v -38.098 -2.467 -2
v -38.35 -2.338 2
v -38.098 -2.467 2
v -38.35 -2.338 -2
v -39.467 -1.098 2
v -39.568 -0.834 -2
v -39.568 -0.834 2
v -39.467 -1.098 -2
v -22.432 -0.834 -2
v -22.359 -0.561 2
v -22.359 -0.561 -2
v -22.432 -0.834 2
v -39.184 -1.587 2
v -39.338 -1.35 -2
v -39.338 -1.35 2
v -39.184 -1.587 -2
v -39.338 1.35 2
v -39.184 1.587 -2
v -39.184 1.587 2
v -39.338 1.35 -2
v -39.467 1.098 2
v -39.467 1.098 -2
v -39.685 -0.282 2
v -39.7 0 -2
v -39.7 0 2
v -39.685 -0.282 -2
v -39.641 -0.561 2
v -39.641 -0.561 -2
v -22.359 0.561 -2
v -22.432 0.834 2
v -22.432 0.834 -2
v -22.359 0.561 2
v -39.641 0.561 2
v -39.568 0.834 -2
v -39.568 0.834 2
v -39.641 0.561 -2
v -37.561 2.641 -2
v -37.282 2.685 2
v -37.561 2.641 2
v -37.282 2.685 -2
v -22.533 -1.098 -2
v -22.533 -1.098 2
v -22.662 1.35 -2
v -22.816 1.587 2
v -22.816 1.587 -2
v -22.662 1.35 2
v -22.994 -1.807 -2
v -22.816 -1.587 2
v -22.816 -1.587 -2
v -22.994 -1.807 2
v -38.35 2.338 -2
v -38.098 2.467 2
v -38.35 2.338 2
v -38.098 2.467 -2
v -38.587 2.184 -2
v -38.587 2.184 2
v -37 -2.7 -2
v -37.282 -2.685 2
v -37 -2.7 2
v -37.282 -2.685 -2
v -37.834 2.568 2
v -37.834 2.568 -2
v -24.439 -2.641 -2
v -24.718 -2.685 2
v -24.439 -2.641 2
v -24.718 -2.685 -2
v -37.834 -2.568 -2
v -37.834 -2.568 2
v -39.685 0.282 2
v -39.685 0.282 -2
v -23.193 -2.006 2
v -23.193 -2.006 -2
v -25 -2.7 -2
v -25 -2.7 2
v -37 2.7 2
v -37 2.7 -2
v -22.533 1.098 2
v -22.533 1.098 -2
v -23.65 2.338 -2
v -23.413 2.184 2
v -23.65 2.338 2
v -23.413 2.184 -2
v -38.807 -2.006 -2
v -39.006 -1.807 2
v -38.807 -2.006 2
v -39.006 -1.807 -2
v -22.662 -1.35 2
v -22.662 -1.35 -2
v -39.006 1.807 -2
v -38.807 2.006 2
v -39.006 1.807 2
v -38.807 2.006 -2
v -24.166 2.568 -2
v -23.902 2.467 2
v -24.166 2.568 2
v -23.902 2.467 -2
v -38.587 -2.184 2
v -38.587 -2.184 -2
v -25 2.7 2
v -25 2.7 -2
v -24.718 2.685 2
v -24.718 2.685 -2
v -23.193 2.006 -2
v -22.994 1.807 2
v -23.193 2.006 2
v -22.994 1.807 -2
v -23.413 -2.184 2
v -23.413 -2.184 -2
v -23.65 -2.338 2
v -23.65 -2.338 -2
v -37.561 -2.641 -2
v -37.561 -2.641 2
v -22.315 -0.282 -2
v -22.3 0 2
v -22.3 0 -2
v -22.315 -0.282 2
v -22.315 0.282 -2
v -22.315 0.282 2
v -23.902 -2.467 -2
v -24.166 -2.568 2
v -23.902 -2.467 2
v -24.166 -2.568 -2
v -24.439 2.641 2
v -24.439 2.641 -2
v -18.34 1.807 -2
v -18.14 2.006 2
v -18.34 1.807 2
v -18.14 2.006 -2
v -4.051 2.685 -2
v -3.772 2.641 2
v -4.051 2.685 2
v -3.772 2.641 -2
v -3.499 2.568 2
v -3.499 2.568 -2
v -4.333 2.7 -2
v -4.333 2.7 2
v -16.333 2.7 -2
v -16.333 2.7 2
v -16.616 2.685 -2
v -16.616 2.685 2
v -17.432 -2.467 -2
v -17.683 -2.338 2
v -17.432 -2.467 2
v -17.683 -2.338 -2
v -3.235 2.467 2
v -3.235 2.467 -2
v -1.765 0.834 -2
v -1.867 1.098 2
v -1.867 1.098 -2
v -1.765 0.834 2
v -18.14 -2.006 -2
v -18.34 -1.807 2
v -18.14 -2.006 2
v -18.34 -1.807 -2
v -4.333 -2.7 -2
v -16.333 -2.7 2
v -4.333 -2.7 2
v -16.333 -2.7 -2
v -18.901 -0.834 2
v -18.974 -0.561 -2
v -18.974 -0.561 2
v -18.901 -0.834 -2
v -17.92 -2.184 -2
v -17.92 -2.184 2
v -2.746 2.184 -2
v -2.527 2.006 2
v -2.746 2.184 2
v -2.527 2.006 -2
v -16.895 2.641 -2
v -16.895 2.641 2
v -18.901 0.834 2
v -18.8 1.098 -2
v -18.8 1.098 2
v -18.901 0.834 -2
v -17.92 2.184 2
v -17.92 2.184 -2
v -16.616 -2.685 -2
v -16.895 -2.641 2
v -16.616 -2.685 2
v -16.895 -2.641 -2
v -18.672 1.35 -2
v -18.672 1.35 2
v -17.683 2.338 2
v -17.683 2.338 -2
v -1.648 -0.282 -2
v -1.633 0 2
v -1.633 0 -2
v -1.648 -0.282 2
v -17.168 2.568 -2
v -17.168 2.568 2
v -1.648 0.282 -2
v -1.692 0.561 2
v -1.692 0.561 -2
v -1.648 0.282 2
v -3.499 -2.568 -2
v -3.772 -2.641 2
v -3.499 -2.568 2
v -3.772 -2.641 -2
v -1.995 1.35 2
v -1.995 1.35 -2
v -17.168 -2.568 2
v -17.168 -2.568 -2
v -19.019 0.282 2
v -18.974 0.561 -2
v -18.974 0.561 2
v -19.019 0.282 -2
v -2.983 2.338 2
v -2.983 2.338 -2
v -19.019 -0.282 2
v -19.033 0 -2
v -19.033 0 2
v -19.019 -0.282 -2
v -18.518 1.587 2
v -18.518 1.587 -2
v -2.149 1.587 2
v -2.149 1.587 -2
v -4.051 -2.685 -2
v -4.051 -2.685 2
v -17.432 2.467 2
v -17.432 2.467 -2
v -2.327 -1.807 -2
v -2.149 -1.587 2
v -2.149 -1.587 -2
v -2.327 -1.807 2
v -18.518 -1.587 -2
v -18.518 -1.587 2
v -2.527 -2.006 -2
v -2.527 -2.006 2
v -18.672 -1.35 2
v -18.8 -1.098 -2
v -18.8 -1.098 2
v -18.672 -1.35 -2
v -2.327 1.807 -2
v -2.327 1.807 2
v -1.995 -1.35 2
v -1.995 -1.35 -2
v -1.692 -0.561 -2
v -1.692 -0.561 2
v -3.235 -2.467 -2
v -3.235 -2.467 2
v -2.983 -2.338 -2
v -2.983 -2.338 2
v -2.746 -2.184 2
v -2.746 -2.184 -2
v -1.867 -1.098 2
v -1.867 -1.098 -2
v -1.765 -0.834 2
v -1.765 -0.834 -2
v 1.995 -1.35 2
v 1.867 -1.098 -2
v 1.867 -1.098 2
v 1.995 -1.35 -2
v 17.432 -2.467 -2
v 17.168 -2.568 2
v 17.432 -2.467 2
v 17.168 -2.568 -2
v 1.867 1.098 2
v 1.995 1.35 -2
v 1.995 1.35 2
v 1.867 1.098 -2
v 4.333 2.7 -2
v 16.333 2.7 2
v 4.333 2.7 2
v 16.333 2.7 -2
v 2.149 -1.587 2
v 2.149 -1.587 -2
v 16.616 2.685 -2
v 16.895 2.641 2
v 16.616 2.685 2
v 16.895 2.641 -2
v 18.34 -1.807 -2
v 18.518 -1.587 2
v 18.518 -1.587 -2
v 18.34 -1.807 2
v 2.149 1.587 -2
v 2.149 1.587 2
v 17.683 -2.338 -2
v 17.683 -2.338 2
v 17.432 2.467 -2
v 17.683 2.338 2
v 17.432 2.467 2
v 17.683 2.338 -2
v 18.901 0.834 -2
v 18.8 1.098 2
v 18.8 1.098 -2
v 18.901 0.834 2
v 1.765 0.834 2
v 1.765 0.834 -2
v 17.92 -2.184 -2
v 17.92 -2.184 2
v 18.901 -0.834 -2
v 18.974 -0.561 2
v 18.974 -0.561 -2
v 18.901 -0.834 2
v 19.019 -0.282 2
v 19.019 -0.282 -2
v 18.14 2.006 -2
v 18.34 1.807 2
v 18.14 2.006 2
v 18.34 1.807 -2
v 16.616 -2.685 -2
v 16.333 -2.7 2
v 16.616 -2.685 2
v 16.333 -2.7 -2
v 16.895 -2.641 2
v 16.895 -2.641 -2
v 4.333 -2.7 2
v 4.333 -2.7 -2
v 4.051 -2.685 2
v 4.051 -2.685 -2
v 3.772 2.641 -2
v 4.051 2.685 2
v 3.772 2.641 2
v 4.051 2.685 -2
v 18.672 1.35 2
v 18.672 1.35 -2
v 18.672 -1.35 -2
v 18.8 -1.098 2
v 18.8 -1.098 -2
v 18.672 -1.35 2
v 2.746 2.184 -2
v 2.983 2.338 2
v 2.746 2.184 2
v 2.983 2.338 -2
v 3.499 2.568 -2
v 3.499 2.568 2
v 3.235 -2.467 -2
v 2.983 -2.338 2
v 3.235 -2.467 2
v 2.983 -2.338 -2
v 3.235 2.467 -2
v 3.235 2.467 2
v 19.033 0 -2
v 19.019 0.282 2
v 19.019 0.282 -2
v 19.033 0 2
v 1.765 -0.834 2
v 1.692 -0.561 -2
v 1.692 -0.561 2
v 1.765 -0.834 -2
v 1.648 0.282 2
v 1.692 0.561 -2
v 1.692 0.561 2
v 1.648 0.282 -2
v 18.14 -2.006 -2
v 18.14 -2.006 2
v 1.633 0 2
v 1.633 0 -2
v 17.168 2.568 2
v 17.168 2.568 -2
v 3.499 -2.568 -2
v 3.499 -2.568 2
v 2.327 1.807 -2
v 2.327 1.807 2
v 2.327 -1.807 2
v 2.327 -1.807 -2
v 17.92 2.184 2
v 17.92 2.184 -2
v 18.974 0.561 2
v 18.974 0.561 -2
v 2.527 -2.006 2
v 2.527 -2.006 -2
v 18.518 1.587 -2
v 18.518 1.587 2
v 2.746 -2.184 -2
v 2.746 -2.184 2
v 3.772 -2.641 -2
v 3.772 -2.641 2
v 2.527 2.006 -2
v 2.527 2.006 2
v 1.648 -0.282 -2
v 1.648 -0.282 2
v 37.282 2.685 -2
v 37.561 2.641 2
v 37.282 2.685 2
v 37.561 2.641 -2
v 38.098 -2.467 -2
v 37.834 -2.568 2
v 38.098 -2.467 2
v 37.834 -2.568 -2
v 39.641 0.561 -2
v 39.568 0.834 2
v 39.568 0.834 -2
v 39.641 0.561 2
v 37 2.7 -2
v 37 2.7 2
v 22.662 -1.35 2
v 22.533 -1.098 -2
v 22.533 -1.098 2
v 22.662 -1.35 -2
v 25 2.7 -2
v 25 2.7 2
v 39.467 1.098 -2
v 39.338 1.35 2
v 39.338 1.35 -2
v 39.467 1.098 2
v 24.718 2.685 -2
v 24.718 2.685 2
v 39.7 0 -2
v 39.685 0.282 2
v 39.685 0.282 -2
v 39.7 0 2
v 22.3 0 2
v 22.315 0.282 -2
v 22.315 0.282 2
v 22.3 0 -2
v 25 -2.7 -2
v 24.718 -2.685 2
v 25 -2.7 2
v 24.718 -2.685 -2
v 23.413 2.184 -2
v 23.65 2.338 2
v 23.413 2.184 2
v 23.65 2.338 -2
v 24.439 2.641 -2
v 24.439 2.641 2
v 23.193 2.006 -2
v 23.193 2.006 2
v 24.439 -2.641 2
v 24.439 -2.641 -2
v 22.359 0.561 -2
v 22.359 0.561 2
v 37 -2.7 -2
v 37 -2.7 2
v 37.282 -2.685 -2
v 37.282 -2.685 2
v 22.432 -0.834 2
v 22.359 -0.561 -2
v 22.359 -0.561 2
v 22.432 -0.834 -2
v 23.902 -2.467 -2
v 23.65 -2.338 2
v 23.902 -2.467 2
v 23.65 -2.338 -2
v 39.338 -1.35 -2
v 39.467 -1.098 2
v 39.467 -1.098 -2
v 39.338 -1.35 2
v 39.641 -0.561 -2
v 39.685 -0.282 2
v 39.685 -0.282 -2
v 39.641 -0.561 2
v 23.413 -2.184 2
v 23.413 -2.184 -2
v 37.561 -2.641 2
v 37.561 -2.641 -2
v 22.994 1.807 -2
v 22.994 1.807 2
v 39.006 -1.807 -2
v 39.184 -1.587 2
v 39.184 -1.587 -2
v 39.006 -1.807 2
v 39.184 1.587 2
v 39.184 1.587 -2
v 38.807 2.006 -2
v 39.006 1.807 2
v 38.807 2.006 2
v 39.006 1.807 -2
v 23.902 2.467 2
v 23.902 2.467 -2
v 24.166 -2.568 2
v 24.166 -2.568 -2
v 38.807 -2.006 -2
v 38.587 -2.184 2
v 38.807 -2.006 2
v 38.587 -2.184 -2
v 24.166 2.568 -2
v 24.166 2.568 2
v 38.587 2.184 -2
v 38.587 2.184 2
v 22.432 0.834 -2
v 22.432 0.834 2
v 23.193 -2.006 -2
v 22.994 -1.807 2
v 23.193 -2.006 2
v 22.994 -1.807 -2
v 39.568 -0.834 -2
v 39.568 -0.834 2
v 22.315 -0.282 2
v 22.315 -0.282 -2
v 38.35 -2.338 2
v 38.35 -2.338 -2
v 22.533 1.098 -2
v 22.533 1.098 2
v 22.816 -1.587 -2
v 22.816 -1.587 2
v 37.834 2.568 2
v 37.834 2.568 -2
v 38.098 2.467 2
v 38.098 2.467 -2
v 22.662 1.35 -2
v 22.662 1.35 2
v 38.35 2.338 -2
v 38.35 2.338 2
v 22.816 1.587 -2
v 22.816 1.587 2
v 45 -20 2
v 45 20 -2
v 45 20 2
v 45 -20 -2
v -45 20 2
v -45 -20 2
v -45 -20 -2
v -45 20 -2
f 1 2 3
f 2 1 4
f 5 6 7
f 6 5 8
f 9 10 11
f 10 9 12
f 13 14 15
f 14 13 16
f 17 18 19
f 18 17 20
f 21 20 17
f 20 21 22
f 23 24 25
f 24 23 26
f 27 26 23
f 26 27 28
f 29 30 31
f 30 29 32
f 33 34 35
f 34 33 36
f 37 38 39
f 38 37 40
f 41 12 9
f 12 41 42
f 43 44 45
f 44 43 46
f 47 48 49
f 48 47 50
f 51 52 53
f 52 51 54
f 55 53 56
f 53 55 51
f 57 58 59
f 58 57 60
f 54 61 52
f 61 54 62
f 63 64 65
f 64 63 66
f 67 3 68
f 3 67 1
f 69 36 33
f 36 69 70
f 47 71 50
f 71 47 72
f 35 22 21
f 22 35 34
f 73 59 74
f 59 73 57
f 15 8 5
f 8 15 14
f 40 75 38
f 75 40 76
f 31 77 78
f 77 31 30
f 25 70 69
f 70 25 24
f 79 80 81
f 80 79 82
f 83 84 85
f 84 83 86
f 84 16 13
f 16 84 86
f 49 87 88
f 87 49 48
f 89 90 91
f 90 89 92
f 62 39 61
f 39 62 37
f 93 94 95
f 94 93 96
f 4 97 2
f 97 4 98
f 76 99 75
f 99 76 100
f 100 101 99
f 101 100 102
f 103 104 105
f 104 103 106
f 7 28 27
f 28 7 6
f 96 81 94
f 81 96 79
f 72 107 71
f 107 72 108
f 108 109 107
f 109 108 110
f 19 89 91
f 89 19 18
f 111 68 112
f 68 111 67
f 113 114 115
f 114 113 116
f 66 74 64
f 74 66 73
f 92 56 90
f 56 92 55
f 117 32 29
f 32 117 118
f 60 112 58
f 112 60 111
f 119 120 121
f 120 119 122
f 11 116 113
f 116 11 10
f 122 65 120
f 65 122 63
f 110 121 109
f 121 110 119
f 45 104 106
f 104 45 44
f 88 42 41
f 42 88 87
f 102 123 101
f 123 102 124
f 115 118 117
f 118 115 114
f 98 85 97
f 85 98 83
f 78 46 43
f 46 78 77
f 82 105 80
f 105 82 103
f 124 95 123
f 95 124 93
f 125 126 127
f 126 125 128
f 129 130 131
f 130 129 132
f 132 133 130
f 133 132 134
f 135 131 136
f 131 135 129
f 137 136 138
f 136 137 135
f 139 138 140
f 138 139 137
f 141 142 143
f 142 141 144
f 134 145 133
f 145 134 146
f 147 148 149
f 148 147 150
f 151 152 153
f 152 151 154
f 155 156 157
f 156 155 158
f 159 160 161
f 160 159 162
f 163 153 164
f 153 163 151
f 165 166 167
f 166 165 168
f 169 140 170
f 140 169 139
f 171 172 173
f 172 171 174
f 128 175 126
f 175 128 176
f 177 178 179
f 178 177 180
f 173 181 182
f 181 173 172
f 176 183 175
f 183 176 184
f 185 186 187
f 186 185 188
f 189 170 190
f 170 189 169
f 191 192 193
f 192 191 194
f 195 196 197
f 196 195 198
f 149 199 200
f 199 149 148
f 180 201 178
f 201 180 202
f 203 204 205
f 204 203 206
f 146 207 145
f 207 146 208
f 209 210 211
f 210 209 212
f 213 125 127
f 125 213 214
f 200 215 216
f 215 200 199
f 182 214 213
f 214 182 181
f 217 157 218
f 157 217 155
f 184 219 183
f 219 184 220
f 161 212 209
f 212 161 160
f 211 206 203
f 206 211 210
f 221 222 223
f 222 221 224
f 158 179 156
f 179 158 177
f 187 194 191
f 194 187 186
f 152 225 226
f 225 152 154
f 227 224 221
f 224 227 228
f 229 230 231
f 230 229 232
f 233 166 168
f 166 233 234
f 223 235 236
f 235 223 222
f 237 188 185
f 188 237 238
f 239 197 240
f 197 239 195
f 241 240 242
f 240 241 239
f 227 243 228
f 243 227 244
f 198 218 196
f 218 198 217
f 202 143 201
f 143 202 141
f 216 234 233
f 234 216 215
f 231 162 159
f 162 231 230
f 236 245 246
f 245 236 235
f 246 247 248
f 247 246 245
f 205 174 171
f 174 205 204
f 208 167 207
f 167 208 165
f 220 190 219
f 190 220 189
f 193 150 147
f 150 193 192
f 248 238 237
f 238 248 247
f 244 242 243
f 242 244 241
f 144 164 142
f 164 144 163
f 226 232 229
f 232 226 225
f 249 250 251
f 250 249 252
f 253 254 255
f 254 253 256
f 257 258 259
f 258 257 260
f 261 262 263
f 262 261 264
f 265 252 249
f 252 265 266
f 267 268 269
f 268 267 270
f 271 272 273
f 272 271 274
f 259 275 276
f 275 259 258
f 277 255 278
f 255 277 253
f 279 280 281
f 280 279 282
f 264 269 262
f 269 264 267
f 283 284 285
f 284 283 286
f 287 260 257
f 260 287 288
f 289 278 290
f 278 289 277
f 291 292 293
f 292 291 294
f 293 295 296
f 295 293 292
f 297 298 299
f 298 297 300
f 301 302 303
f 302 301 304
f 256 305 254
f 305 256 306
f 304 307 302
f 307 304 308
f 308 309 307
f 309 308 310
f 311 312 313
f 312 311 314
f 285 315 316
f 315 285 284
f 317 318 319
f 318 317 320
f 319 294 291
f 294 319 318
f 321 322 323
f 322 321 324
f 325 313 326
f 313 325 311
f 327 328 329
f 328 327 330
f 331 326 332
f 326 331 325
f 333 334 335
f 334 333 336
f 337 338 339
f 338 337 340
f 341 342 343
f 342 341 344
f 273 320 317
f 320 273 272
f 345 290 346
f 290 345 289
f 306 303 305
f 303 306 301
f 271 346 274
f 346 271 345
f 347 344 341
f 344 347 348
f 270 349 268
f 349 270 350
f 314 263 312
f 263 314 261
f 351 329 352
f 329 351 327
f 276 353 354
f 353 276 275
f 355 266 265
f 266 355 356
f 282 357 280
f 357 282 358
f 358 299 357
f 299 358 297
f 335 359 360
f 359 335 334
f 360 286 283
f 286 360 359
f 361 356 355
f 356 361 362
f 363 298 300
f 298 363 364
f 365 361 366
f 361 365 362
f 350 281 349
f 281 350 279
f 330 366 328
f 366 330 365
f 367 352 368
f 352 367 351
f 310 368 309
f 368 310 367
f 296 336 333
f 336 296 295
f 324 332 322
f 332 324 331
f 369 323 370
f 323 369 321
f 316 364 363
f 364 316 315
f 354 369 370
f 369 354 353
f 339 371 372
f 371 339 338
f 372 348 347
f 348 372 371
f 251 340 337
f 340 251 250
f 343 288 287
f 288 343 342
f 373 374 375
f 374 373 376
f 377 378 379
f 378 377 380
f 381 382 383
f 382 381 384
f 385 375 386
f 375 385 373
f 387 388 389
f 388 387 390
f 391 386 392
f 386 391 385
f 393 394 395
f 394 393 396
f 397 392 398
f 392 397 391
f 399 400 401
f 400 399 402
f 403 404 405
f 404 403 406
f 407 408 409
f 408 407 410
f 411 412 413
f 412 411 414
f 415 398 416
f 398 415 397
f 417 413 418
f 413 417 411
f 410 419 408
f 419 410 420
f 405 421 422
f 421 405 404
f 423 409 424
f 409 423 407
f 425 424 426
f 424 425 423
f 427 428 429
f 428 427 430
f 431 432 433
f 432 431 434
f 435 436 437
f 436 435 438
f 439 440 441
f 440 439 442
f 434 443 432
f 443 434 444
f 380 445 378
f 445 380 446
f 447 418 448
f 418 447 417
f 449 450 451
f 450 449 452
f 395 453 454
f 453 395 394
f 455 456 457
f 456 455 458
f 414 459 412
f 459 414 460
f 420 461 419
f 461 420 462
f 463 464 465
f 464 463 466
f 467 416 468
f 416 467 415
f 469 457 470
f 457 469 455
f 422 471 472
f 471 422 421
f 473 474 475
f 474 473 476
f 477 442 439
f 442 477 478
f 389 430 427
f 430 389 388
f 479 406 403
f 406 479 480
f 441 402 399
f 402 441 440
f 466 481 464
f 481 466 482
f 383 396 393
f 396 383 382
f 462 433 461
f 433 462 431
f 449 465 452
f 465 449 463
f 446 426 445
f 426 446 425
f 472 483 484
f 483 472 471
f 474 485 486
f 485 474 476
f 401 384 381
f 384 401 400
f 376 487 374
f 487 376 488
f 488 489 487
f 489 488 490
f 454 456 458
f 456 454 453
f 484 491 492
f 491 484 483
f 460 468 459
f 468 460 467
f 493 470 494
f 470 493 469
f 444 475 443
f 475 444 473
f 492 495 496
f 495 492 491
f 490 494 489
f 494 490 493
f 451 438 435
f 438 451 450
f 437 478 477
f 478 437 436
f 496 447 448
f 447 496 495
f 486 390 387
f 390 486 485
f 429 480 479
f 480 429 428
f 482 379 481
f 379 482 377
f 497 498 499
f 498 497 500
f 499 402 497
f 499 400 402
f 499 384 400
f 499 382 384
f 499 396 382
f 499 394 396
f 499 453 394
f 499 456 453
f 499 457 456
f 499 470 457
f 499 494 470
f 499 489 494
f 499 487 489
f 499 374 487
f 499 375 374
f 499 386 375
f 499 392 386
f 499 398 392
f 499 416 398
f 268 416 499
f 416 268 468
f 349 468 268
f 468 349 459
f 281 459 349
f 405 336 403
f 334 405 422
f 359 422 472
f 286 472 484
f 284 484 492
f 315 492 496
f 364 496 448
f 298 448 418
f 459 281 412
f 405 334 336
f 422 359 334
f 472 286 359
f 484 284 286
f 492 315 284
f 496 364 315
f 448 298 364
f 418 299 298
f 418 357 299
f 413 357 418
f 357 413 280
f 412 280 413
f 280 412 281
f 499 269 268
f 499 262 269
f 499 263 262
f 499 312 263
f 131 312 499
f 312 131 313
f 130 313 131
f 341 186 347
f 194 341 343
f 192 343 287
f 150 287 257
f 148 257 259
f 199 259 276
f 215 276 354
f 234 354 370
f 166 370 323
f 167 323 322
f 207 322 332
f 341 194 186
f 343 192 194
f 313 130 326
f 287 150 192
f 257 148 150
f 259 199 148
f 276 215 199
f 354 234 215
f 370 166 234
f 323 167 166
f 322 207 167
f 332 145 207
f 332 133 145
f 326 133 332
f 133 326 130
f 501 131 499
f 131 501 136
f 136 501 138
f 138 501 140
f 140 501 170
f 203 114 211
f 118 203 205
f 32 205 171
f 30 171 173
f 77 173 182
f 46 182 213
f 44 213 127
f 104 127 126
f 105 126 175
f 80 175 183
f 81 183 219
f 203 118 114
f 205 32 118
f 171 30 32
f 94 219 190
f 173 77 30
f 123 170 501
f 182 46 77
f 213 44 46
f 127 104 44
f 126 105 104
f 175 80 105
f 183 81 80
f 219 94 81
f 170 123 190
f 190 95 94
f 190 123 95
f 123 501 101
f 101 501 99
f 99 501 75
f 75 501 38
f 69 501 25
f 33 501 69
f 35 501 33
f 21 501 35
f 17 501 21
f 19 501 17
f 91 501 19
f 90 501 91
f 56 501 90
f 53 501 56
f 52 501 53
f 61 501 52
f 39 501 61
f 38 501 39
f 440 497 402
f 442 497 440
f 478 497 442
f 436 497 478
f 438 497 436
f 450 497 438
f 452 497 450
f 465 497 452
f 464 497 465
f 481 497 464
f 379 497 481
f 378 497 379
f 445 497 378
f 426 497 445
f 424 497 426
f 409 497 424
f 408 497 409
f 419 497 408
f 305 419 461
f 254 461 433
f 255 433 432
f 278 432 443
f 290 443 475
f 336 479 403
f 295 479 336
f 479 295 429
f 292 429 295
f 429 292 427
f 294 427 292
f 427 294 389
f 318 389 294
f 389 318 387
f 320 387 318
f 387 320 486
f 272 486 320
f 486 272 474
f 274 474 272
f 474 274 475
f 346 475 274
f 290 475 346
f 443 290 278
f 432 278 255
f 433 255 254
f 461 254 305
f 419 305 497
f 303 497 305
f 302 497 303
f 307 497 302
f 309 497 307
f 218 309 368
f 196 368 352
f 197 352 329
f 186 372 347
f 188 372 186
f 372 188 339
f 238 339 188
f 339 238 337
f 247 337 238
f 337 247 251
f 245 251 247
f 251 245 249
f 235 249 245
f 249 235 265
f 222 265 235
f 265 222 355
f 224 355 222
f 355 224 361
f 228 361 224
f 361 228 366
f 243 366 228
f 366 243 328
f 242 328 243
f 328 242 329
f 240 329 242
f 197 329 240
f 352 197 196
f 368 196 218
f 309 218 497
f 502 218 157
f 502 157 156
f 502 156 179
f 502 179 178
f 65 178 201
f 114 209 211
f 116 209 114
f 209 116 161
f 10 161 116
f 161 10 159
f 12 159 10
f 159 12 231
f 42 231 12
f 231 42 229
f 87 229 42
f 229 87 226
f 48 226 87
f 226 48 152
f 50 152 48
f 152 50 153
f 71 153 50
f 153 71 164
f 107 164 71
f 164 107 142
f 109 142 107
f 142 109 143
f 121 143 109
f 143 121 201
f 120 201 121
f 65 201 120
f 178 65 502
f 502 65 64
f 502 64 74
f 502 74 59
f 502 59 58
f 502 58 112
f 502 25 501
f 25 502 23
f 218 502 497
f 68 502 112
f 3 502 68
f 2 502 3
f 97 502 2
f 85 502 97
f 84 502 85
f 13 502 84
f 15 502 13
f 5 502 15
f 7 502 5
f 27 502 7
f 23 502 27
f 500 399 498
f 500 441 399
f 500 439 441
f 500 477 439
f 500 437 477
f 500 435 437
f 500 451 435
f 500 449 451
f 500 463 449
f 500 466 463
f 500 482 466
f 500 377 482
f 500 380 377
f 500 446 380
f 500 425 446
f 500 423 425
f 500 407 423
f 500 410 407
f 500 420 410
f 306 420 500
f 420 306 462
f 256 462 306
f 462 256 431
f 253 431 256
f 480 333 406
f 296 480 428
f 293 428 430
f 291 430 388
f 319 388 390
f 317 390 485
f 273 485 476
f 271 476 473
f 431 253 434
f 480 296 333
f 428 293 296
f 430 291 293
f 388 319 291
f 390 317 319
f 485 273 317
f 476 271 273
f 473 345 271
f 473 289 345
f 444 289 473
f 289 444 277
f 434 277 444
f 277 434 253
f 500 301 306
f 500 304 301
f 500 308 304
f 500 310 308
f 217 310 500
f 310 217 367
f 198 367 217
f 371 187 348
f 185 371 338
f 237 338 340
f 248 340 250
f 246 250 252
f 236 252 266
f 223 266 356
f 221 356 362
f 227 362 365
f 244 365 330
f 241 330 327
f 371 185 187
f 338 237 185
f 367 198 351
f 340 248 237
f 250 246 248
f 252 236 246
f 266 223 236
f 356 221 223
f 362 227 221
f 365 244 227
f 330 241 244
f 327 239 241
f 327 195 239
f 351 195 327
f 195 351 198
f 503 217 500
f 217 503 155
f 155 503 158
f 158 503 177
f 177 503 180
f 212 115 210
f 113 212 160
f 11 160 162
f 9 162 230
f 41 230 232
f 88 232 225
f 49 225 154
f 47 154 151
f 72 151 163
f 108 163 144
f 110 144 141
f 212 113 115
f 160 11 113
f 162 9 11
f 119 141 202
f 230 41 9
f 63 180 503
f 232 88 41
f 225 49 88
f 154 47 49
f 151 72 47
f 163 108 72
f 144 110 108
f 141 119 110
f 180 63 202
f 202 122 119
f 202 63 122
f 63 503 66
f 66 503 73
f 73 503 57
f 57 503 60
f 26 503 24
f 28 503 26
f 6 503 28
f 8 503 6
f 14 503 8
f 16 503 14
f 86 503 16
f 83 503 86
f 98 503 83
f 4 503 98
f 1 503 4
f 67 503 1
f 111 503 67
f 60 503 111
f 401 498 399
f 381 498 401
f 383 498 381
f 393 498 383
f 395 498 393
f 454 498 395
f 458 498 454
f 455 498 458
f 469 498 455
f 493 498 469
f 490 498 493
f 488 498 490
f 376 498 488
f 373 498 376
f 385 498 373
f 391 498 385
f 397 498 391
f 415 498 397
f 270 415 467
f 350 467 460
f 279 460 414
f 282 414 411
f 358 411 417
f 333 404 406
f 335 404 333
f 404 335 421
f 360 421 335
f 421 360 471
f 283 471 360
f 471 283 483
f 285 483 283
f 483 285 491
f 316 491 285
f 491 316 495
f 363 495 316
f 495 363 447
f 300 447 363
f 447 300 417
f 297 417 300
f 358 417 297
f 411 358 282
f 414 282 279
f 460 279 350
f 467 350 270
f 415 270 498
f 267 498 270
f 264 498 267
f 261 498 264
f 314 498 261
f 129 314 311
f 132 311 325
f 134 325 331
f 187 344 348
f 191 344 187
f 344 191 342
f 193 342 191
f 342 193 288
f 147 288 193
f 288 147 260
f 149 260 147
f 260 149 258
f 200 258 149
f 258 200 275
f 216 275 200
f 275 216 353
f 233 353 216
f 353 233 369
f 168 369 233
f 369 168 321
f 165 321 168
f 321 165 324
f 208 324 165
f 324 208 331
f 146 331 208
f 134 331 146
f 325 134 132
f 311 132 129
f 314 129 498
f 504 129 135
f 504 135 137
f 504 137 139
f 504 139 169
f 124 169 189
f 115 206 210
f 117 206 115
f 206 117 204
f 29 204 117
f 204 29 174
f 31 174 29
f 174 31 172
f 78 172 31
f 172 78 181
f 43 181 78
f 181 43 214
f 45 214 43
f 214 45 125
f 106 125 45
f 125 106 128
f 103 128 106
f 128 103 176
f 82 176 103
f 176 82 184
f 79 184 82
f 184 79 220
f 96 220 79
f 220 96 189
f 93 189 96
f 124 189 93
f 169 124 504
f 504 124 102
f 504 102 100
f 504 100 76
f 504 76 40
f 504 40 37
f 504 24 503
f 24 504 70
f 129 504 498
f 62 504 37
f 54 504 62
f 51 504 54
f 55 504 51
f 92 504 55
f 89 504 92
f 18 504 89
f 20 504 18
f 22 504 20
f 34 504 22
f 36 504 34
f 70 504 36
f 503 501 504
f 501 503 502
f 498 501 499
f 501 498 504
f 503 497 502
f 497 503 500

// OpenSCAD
// Slotted mounting plate.
$fn = 60;
eps = 0.02;
plate_l = 90;
plate_w = 40;
plate_t = 4;
slot_l = 12;
module slot(x) { hull() { translate([x-slot_l/2,0,-plate_t/2-eps]) cylinder(d=5.4,h=plate_t+2*eps); translate([x+slot_l/2,0,-plate_t/2-eps]) cylinder(d=5.4,h=plate_t+2*eps); } }
difference() { cube([plate_l,plate_w,plate_t],center=true); for(i=[0:3]) slot(-plate_l/2+14+i*(plate_l-28)/max(1,3)); }
